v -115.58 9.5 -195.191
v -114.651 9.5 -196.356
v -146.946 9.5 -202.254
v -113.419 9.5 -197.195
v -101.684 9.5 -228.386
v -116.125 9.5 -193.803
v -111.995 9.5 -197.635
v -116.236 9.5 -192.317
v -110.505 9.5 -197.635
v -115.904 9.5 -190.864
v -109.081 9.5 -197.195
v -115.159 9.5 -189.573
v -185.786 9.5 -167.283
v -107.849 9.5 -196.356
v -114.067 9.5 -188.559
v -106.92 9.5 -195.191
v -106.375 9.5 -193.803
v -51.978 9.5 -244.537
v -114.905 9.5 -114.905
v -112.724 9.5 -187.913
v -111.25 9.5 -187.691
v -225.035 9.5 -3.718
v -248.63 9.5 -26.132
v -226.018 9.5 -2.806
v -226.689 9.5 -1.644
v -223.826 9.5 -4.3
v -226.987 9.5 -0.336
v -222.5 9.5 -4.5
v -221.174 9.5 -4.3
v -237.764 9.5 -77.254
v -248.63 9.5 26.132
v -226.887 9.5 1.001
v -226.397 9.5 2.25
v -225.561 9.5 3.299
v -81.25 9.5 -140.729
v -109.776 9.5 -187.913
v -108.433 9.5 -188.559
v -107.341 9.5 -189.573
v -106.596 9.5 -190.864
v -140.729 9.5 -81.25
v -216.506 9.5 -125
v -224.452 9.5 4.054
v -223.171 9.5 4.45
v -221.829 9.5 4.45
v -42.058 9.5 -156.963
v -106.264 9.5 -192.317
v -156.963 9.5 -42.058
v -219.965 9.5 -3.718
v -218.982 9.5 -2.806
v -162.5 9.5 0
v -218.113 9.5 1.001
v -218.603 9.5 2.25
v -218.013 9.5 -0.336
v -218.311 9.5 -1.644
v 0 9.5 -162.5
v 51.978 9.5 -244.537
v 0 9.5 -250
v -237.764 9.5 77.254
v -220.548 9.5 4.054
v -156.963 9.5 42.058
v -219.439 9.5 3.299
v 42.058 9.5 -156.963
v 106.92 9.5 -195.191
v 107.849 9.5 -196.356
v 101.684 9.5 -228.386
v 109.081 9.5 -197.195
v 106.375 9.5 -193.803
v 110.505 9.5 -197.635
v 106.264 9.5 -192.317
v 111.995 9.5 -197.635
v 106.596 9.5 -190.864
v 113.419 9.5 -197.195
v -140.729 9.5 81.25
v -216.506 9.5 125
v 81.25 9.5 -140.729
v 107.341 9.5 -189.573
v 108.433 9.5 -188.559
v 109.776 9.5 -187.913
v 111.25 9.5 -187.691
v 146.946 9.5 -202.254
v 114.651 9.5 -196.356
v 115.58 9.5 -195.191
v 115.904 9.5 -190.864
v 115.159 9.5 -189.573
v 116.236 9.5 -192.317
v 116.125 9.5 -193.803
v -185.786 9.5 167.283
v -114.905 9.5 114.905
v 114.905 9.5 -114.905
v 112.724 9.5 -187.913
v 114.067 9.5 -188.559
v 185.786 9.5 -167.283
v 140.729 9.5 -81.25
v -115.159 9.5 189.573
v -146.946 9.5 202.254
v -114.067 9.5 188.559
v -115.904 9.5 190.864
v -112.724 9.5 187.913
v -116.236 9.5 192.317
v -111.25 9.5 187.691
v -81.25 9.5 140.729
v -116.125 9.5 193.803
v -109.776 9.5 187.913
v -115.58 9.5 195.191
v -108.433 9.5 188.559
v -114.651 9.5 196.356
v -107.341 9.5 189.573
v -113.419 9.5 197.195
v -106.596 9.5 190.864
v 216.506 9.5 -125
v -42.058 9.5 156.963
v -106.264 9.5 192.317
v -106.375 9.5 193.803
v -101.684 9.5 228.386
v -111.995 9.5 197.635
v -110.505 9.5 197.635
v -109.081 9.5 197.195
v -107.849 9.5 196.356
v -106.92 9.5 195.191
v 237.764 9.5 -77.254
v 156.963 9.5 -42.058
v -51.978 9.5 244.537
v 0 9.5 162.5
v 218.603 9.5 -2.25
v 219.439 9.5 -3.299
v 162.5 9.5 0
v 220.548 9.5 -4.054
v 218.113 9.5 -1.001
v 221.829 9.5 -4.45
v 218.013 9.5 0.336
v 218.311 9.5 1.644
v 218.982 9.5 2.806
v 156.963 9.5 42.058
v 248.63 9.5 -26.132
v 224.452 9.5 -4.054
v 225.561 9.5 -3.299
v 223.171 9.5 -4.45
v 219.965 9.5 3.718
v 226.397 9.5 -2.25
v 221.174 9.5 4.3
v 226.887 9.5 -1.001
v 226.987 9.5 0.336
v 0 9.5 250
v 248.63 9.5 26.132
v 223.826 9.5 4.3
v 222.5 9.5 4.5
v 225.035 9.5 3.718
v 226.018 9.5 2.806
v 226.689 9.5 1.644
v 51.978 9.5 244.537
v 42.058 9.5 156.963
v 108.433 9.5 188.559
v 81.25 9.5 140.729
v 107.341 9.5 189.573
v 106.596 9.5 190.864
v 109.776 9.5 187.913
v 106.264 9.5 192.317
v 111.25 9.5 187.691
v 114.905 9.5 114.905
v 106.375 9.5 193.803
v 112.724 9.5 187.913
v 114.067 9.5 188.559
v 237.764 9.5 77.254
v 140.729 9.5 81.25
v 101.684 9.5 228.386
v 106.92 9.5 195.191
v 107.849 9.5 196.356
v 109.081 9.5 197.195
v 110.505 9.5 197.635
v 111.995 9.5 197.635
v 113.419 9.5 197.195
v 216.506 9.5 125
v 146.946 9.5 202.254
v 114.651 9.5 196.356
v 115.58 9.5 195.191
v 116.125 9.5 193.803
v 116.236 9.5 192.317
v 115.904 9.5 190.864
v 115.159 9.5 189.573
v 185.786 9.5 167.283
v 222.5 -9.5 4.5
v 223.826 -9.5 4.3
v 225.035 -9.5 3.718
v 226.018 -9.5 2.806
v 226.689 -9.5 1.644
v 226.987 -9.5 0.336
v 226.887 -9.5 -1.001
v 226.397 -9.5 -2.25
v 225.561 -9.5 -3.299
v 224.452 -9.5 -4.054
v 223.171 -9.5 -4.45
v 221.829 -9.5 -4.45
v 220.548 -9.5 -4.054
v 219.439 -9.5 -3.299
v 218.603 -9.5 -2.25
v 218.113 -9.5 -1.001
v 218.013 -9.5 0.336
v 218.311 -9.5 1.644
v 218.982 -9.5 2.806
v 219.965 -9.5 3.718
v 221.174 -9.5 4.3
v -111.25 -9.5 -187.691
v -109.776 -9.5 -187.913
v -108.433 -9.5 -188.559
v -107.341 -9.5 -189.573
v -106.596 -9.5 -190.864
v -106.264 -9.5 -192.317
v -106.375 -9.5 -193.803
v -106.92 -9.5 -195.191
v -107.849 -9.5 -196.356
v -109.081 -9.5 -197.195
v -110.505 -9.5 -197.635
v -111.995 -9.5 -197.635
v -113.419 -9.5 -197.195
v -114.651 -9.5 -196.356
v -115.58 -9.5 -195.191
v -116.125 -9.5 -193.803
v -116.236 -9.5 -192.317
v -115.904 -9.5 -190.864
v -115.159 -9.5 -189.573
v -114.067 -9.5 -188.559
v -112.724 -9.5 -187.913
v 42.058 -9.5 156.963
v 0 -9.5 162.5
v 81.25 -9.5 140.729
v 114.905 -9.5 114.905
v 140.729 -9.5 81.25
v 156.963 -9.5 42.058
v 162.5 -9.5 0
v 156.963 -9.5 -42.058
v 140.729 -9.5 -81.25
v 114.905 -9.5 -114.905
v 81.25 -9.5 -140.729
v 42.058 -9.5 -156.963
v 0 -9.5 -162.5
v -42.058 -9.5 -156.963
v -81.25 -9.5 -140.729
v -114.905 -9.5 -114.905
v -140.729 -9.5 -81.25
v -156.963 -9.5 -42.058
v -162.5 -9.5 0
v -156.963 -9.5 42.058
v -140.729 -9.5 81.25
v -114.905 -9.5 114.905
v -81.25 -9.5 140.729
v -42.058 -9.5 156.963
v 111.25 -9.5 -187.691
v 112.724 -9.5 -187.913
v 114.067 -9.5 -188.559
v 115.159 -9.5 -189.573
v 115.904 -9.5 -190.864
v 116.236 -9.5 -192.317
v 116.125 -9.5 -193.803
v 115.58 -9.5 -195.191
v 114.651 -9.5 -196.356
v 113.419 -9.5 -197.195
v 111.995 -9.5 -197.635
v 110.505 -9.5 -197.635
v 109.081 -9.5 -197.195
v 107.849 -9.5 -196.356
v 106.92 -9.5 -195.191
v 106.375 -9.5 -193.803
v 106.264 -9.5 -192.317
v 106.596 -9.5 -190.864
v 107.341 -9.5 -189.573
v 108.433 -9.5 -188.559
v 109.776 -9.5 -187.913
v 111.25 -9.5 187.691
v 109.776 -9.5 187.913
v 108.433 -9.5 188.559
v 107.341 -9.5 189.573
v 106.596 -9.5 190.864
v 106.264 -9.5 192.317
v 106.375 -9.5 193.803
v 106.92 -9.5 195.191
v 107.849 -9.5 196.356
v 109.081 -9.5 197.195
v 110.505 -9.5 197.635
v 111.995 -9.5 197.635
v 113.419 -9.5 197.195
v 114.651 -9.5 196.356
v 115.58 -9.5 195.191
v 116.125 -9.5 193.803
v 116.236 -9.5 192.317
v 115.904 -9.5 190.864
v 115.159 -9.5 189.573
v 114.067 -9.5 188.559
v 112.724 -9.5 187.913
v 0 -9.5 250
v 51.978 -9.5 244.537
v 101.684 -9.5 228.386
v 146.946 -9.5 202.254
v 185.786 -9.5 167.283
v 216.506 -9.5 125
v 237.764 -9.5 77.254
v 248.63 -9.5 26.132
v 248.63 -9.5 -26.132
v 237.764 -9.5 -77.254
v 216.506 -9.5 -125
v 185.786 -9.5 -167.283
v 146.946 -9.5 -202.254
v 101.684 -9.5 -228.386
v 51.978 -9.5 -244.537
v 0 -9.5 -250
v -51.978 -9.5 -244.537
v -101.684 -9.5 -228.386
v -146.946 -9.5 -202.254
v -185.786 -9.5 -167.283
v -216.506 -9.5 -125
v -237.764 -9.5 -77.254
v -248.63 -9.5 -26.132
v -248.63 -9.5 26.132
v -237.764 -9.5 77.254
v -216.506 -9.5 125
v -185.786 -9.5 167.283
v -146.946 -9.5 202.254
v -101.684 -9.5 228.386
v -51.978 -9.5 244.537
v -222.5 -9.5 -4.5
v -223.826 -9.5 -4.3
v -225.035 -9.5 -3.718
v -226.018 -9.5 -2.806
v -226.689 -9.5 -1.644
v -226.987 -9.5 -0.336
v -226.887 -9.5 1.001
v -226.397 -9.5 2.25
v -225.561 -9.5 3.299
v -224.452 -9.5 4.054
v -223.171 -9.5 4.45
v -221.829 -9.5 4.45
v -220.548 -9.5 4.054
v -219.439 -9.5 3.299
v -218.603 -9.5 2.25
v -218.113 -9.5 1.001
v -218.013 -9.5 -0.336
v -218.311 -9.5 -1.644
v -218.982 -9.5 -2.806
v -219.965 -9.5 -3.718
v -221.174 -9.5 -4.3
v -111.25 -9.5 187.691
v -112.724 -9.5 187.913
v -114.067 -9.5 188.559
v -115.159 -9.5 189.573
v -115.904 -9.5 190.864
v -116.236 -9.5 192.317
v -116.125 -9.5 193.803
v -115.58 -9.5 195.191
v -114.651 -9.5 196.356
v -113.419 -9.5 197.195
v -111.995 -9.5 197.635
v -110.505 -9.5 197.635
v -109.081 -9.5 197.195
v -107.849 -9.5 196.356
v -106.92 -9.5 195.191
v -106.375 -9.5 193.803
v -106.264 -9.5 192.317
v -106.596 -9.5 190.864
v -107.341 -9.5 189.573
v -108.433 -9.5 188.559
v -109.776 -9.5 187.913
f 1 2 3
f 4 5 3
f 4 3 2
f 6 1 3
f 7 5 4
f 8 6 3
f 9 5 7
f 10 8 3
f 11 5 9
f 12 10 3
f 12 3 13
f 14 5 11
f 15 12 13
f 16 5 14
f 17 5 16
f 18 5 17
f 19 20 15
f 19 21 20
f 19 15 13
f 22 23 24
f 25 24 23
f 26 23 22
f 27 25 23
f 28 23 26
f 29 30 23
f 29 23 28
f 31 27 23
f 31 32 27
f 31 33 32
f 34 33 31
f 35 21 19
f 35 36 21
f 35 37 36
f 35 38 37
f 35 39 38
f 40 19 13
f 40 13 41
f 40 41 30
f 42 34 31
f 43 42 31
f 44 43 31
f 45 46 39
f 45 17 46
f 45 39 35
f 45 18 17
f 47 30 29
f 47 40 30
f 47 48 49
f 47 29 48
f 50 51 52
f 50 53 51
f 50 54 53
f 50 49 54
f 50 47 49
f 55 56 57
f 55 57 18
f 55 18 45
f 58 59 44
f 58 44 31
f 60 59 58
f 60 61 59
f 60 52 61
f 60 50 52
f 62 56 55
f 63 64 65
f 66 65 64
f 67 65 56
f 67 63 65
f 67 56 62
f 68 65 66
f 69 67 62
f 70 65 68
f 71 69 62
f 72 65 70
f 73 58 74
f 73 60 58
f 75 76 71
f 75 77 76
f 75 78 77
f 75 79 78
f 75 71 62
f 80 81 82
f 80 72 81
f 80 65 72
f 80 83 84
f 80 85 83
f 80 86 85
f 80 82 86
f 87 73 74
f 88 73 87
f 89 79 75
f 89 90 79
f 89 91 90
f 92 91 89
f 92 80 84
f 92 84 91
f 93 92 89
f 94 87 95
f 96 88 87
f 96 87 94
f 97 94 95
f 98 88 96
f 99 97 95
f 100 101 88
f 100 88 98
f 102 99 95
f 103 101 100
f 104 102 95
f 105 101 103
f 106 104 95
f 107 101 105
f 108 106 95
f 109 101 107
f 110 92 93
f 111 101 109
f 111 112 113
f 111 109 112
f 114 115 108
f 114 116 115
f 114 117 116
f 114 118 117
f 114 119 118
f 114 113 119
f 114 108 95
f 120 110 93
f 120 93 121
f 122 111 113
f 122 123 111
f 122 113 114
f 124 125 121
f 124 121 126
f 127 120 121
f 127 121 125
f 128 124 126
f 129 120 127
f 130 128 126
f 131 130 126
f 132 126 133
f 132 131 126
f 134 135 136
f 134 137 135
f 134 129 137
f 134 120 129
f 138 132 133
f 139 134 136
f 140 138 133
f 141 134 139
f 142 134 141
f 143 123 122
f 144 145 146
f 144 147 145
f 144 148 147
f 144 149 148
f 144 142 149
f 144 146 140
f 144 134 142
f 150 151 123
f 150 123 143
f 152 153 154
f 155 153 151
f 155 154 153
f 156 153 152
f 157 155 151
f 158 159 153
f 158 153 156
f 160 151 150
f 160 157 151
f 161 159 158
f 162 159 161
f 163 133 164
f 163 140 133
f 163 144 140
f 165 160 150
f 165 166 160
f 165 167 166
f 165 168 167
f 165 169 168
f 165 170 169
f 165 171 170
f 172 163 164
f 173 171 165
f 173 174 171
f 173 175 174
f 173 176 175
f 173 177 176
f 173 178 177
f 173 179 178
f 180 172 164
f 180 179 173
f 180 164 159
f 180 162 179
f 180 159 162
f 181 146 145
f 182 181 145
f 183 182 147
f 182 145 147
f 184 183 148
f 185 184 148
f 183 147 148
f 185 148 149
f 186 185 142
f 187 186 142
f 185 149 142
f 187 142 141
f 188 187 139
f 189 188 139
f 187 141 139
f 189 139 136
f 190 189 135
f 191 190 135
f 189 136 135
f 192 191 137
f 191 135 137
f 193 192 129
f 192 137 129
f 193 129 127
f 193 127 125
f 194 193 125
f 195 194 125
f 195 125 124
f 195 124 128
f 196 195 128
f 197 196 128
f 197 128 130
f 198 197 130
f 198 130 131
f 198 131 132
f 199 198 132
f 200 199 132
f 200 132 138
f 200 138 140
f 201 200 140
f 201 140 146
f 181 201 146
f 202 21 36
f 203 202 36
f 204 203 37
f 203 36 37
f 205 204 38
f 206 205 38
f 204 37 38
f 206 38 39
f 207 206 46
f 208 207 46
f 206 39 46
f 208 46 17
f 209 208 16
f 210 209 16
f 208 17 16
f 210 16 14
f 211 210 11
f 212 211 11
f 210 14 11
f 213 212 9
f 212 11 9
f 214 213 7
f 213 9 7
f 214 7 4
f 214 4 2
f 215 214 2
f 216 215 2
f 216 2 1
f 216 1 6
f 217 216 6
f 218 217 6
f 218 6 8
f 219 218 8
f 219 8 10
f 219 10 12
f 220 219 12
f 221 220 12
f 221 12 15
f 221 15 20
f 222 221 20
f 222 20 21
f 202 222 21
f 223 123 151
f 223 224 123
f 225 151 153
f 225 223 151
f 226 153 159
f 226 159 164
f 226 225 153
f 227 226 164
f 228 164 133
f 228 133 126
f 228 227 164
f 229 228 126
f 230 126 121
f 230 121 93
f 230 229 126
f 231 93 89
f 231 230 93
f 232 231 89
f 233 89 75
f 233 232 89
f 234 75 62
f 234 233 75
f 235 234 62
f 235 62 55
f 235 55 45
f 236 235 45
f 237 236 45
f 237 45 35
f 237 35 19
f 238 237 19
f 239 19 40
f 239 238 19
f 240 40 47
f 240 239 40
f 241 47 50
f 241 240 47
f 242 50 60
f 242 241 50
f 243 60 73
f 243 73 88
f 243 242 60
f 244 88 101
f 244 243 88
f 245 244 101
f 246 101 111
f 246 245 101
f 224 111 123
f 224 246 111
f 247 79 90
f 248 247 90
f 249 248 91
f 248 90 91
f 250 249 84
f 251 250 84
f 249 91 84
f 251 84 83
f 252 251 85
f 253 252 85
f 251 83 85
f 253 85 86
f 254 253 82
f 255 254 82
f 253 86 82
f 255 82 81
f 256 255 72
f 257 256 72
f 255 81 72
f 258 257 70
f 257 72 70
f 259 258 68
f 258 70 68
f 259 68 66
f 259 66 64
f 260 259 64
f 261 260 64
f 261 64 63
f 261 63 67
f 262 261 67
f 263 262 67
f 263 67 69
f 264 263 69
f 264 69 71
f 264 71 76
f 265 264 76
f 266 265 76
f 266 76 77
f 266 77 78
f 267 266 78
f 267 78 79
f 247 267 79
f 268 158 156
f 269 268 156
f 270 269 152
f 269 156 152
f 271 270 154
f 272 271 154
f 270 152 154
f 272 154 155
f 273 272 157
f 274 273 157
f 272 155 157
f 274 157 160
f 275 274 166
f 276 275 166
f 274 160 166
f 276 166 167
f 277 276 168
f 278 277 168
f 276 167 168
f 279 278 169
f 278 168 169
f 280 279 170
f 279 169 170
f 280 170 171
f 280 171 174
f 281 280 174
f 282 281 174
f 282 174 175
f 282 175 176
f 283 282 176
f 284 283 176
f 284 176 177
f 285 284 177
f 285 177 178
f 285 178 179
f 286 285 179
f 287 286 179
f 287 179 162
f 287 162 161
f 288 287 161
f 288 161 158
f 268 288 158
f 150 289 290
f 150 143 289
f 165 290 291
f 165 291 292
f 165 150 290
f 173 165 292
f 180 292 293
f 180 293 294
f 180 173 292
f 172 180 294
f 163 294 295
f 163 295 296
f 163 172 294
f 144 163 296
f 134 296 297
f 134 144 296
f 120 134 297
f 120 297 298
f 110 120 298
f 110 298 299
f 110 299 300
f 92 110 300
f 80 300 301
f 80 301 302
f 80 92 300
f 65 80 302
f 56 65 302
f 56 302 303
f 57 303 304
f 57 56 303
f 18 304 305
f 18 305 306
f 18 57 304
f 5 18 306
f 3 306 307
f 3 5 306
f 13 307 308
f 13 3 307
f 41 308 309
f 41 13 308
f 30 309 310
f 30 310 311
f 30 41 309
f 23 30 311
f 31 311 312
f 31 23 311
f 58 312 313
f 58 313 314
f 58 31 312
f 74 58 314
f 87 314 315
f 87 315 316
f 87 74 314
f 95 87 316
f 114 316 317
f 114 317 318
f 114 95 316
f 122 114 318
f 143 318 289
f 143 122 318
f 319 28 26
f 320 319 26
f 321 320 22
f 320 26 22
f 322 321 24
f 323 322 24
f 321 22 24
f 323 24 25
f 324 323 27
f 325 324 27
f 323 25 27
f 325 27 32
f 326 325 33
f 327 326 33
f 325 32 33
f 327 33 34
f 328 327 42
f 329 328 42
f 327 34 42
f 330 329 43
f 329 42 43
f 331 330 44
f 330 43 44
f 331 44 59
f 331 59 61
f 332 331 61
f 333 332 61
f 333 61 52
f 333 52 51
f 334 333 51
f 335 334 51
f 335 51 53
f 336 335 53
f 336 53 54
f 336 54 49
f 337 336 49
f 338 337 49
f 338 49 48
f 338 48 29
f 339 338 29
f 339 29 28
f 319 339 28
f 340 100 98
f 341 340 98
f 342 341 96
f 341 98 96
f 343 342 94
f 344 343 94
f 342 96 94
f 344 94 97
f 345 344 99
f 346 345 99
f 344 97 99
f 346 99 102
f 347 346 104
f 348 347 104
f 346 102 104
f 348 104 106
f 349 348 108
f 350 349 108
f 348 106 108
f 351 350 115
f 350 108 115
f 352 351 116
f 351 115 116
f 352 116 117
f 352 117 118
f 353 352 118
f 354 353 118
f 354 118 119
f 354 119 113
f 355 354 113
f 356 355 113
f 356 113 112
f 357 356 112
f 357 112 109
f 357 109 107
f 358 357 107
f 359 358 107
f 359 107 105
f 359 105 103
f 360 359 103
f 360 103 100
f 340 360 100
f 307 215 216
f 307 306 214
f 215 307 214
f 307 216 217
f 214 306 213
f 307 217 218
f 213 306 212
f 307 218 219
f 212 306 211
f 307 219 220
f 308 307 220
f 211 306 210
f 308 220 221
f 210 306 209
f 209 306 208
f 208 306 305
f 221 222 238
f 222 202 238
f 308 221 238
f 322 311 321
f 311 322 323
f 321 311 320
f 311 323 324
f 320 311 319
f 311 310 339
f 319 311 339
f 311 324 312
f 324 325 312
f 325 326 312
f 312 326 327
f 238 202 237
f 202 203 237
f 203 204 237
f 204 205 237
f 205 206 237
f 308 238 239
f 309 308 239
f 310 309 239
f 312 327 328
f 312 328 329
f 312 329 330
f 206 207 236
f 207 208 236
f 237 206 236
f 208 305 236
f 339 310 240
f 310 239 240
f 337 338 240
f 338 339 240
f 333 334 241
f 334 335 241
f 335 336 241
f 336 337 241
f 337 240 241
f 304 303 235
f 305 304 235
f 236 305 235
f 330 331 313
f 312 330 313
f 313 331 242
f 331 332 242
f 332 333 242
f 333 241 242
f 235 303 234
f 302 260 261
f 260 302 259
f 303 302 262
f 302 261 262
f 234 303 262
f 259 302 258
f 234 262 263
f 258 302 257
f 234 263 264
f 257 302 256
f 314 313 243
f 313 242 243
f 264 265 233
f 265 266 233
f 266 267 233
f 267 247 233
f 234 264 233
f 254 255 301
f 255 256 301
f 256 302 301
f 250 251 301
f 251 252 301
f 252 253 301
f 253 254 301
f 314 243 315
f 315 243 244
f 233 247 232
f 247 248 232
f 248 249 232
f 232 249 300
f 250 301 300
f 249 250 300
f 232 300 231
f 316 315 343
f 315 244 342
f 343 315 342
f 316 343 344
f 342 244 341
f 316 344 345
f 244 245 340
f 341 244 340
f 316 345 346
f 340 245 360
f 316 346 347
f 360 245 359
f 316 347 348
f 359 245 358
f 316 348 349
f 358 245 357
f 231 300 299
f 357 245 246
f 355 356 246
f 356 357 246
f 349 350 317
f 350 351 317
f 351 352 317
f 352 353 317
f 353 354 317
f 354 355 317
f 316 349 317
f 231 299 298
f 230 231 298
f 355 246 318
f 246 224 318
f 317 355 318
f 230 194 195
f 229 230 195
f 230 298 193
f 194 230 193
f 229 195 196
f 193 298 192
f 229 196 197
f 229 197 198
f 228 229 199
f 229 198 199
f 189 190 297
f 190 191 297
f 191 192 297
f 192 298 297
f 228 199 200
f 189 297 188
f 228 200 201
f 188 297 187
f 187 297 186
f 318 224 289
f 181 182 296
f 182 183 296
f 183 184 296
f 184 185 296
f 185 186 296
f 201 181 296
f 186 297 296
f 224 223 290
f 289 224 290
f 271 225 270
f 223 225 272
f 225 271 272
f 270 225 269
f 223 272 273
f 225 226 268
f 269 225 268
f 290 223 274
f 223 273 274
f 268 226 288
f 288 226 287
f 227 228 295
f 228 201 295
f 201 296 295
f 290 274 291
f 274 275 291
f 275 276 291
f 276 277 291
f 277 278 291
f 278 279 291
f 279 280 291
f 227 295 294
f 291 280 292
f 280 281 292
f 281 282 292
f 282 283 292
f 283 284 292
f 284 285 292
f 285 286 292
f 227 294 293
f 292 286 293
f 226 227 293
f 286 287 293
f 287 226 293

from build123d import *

# Parameters (mm, degrees)
SKETCH1_R           = 250
SKETCH1_R_2         = 162.5
BOSS_EXTRUDE1_DEPTH = 9.5
SKETCH2_R           = 5
SKETCH2_R_2         = 4.5
CUT_EXTRUDE1_DEPTH  = 355.063553617


with BuildPart() as part:
    # Sketch1 → Boss-Extrude1 (new, symmetric)
    with BuildSketch(Plane(origin=(0, 0, 0), x_dir=(1, 0, 0), z_dir=(0, 1, 0))):
        with Locations(Location((0, 0, 0), (0, 0, 270))):
            Circle(SKETCH1_R)
        with Locations(Location((0, 0, 0), (0, 0, 270))):
            Circle(SKETCH1_R_2, mode=Mode.SUBTRACT)
    extrude(amount=BOSS_EXTRUDE1_DEPTH, both=True)

    # Sketch2 → Cut-Extrude1 (cut, through all)
    with BuildSketch(Plane(origin=(0, 9.5, 0), x_dir=(1, 0, 0), z_dir=(0, 1, 0))):
        with Locations(Location((-111.25, 192.690652342, 0), (0, 0, 270))):
            Circle(SKETCH2_R)
        with Locations(Location((111.25, 192.690652342, 0), (0, 0, 270))):
            Circle(SKETCH2_R)
        with Locations(Location((222.5, 0, 0), (0, 0, 270))):
            Circle(SKETCH2_R_2)
        with Locations(Location((-111.25, -192.690652342, 0), (0, 0, 90))):
            Circle(SKETCH2_R)
        with Locations(Location((-222.5, 0, 0), (0, 0, 90))):
            Circle(SKETCH2_R_2)
        with Locations(Location((111.25, -192.690652342, 0), (0, 0, 90))):
            Circle(SKETCH2_R)
    extrude(amount=-CUT_EXTRUDE1_DEPTH, mode=Mode.SUBTRACT)


solid = part.part
